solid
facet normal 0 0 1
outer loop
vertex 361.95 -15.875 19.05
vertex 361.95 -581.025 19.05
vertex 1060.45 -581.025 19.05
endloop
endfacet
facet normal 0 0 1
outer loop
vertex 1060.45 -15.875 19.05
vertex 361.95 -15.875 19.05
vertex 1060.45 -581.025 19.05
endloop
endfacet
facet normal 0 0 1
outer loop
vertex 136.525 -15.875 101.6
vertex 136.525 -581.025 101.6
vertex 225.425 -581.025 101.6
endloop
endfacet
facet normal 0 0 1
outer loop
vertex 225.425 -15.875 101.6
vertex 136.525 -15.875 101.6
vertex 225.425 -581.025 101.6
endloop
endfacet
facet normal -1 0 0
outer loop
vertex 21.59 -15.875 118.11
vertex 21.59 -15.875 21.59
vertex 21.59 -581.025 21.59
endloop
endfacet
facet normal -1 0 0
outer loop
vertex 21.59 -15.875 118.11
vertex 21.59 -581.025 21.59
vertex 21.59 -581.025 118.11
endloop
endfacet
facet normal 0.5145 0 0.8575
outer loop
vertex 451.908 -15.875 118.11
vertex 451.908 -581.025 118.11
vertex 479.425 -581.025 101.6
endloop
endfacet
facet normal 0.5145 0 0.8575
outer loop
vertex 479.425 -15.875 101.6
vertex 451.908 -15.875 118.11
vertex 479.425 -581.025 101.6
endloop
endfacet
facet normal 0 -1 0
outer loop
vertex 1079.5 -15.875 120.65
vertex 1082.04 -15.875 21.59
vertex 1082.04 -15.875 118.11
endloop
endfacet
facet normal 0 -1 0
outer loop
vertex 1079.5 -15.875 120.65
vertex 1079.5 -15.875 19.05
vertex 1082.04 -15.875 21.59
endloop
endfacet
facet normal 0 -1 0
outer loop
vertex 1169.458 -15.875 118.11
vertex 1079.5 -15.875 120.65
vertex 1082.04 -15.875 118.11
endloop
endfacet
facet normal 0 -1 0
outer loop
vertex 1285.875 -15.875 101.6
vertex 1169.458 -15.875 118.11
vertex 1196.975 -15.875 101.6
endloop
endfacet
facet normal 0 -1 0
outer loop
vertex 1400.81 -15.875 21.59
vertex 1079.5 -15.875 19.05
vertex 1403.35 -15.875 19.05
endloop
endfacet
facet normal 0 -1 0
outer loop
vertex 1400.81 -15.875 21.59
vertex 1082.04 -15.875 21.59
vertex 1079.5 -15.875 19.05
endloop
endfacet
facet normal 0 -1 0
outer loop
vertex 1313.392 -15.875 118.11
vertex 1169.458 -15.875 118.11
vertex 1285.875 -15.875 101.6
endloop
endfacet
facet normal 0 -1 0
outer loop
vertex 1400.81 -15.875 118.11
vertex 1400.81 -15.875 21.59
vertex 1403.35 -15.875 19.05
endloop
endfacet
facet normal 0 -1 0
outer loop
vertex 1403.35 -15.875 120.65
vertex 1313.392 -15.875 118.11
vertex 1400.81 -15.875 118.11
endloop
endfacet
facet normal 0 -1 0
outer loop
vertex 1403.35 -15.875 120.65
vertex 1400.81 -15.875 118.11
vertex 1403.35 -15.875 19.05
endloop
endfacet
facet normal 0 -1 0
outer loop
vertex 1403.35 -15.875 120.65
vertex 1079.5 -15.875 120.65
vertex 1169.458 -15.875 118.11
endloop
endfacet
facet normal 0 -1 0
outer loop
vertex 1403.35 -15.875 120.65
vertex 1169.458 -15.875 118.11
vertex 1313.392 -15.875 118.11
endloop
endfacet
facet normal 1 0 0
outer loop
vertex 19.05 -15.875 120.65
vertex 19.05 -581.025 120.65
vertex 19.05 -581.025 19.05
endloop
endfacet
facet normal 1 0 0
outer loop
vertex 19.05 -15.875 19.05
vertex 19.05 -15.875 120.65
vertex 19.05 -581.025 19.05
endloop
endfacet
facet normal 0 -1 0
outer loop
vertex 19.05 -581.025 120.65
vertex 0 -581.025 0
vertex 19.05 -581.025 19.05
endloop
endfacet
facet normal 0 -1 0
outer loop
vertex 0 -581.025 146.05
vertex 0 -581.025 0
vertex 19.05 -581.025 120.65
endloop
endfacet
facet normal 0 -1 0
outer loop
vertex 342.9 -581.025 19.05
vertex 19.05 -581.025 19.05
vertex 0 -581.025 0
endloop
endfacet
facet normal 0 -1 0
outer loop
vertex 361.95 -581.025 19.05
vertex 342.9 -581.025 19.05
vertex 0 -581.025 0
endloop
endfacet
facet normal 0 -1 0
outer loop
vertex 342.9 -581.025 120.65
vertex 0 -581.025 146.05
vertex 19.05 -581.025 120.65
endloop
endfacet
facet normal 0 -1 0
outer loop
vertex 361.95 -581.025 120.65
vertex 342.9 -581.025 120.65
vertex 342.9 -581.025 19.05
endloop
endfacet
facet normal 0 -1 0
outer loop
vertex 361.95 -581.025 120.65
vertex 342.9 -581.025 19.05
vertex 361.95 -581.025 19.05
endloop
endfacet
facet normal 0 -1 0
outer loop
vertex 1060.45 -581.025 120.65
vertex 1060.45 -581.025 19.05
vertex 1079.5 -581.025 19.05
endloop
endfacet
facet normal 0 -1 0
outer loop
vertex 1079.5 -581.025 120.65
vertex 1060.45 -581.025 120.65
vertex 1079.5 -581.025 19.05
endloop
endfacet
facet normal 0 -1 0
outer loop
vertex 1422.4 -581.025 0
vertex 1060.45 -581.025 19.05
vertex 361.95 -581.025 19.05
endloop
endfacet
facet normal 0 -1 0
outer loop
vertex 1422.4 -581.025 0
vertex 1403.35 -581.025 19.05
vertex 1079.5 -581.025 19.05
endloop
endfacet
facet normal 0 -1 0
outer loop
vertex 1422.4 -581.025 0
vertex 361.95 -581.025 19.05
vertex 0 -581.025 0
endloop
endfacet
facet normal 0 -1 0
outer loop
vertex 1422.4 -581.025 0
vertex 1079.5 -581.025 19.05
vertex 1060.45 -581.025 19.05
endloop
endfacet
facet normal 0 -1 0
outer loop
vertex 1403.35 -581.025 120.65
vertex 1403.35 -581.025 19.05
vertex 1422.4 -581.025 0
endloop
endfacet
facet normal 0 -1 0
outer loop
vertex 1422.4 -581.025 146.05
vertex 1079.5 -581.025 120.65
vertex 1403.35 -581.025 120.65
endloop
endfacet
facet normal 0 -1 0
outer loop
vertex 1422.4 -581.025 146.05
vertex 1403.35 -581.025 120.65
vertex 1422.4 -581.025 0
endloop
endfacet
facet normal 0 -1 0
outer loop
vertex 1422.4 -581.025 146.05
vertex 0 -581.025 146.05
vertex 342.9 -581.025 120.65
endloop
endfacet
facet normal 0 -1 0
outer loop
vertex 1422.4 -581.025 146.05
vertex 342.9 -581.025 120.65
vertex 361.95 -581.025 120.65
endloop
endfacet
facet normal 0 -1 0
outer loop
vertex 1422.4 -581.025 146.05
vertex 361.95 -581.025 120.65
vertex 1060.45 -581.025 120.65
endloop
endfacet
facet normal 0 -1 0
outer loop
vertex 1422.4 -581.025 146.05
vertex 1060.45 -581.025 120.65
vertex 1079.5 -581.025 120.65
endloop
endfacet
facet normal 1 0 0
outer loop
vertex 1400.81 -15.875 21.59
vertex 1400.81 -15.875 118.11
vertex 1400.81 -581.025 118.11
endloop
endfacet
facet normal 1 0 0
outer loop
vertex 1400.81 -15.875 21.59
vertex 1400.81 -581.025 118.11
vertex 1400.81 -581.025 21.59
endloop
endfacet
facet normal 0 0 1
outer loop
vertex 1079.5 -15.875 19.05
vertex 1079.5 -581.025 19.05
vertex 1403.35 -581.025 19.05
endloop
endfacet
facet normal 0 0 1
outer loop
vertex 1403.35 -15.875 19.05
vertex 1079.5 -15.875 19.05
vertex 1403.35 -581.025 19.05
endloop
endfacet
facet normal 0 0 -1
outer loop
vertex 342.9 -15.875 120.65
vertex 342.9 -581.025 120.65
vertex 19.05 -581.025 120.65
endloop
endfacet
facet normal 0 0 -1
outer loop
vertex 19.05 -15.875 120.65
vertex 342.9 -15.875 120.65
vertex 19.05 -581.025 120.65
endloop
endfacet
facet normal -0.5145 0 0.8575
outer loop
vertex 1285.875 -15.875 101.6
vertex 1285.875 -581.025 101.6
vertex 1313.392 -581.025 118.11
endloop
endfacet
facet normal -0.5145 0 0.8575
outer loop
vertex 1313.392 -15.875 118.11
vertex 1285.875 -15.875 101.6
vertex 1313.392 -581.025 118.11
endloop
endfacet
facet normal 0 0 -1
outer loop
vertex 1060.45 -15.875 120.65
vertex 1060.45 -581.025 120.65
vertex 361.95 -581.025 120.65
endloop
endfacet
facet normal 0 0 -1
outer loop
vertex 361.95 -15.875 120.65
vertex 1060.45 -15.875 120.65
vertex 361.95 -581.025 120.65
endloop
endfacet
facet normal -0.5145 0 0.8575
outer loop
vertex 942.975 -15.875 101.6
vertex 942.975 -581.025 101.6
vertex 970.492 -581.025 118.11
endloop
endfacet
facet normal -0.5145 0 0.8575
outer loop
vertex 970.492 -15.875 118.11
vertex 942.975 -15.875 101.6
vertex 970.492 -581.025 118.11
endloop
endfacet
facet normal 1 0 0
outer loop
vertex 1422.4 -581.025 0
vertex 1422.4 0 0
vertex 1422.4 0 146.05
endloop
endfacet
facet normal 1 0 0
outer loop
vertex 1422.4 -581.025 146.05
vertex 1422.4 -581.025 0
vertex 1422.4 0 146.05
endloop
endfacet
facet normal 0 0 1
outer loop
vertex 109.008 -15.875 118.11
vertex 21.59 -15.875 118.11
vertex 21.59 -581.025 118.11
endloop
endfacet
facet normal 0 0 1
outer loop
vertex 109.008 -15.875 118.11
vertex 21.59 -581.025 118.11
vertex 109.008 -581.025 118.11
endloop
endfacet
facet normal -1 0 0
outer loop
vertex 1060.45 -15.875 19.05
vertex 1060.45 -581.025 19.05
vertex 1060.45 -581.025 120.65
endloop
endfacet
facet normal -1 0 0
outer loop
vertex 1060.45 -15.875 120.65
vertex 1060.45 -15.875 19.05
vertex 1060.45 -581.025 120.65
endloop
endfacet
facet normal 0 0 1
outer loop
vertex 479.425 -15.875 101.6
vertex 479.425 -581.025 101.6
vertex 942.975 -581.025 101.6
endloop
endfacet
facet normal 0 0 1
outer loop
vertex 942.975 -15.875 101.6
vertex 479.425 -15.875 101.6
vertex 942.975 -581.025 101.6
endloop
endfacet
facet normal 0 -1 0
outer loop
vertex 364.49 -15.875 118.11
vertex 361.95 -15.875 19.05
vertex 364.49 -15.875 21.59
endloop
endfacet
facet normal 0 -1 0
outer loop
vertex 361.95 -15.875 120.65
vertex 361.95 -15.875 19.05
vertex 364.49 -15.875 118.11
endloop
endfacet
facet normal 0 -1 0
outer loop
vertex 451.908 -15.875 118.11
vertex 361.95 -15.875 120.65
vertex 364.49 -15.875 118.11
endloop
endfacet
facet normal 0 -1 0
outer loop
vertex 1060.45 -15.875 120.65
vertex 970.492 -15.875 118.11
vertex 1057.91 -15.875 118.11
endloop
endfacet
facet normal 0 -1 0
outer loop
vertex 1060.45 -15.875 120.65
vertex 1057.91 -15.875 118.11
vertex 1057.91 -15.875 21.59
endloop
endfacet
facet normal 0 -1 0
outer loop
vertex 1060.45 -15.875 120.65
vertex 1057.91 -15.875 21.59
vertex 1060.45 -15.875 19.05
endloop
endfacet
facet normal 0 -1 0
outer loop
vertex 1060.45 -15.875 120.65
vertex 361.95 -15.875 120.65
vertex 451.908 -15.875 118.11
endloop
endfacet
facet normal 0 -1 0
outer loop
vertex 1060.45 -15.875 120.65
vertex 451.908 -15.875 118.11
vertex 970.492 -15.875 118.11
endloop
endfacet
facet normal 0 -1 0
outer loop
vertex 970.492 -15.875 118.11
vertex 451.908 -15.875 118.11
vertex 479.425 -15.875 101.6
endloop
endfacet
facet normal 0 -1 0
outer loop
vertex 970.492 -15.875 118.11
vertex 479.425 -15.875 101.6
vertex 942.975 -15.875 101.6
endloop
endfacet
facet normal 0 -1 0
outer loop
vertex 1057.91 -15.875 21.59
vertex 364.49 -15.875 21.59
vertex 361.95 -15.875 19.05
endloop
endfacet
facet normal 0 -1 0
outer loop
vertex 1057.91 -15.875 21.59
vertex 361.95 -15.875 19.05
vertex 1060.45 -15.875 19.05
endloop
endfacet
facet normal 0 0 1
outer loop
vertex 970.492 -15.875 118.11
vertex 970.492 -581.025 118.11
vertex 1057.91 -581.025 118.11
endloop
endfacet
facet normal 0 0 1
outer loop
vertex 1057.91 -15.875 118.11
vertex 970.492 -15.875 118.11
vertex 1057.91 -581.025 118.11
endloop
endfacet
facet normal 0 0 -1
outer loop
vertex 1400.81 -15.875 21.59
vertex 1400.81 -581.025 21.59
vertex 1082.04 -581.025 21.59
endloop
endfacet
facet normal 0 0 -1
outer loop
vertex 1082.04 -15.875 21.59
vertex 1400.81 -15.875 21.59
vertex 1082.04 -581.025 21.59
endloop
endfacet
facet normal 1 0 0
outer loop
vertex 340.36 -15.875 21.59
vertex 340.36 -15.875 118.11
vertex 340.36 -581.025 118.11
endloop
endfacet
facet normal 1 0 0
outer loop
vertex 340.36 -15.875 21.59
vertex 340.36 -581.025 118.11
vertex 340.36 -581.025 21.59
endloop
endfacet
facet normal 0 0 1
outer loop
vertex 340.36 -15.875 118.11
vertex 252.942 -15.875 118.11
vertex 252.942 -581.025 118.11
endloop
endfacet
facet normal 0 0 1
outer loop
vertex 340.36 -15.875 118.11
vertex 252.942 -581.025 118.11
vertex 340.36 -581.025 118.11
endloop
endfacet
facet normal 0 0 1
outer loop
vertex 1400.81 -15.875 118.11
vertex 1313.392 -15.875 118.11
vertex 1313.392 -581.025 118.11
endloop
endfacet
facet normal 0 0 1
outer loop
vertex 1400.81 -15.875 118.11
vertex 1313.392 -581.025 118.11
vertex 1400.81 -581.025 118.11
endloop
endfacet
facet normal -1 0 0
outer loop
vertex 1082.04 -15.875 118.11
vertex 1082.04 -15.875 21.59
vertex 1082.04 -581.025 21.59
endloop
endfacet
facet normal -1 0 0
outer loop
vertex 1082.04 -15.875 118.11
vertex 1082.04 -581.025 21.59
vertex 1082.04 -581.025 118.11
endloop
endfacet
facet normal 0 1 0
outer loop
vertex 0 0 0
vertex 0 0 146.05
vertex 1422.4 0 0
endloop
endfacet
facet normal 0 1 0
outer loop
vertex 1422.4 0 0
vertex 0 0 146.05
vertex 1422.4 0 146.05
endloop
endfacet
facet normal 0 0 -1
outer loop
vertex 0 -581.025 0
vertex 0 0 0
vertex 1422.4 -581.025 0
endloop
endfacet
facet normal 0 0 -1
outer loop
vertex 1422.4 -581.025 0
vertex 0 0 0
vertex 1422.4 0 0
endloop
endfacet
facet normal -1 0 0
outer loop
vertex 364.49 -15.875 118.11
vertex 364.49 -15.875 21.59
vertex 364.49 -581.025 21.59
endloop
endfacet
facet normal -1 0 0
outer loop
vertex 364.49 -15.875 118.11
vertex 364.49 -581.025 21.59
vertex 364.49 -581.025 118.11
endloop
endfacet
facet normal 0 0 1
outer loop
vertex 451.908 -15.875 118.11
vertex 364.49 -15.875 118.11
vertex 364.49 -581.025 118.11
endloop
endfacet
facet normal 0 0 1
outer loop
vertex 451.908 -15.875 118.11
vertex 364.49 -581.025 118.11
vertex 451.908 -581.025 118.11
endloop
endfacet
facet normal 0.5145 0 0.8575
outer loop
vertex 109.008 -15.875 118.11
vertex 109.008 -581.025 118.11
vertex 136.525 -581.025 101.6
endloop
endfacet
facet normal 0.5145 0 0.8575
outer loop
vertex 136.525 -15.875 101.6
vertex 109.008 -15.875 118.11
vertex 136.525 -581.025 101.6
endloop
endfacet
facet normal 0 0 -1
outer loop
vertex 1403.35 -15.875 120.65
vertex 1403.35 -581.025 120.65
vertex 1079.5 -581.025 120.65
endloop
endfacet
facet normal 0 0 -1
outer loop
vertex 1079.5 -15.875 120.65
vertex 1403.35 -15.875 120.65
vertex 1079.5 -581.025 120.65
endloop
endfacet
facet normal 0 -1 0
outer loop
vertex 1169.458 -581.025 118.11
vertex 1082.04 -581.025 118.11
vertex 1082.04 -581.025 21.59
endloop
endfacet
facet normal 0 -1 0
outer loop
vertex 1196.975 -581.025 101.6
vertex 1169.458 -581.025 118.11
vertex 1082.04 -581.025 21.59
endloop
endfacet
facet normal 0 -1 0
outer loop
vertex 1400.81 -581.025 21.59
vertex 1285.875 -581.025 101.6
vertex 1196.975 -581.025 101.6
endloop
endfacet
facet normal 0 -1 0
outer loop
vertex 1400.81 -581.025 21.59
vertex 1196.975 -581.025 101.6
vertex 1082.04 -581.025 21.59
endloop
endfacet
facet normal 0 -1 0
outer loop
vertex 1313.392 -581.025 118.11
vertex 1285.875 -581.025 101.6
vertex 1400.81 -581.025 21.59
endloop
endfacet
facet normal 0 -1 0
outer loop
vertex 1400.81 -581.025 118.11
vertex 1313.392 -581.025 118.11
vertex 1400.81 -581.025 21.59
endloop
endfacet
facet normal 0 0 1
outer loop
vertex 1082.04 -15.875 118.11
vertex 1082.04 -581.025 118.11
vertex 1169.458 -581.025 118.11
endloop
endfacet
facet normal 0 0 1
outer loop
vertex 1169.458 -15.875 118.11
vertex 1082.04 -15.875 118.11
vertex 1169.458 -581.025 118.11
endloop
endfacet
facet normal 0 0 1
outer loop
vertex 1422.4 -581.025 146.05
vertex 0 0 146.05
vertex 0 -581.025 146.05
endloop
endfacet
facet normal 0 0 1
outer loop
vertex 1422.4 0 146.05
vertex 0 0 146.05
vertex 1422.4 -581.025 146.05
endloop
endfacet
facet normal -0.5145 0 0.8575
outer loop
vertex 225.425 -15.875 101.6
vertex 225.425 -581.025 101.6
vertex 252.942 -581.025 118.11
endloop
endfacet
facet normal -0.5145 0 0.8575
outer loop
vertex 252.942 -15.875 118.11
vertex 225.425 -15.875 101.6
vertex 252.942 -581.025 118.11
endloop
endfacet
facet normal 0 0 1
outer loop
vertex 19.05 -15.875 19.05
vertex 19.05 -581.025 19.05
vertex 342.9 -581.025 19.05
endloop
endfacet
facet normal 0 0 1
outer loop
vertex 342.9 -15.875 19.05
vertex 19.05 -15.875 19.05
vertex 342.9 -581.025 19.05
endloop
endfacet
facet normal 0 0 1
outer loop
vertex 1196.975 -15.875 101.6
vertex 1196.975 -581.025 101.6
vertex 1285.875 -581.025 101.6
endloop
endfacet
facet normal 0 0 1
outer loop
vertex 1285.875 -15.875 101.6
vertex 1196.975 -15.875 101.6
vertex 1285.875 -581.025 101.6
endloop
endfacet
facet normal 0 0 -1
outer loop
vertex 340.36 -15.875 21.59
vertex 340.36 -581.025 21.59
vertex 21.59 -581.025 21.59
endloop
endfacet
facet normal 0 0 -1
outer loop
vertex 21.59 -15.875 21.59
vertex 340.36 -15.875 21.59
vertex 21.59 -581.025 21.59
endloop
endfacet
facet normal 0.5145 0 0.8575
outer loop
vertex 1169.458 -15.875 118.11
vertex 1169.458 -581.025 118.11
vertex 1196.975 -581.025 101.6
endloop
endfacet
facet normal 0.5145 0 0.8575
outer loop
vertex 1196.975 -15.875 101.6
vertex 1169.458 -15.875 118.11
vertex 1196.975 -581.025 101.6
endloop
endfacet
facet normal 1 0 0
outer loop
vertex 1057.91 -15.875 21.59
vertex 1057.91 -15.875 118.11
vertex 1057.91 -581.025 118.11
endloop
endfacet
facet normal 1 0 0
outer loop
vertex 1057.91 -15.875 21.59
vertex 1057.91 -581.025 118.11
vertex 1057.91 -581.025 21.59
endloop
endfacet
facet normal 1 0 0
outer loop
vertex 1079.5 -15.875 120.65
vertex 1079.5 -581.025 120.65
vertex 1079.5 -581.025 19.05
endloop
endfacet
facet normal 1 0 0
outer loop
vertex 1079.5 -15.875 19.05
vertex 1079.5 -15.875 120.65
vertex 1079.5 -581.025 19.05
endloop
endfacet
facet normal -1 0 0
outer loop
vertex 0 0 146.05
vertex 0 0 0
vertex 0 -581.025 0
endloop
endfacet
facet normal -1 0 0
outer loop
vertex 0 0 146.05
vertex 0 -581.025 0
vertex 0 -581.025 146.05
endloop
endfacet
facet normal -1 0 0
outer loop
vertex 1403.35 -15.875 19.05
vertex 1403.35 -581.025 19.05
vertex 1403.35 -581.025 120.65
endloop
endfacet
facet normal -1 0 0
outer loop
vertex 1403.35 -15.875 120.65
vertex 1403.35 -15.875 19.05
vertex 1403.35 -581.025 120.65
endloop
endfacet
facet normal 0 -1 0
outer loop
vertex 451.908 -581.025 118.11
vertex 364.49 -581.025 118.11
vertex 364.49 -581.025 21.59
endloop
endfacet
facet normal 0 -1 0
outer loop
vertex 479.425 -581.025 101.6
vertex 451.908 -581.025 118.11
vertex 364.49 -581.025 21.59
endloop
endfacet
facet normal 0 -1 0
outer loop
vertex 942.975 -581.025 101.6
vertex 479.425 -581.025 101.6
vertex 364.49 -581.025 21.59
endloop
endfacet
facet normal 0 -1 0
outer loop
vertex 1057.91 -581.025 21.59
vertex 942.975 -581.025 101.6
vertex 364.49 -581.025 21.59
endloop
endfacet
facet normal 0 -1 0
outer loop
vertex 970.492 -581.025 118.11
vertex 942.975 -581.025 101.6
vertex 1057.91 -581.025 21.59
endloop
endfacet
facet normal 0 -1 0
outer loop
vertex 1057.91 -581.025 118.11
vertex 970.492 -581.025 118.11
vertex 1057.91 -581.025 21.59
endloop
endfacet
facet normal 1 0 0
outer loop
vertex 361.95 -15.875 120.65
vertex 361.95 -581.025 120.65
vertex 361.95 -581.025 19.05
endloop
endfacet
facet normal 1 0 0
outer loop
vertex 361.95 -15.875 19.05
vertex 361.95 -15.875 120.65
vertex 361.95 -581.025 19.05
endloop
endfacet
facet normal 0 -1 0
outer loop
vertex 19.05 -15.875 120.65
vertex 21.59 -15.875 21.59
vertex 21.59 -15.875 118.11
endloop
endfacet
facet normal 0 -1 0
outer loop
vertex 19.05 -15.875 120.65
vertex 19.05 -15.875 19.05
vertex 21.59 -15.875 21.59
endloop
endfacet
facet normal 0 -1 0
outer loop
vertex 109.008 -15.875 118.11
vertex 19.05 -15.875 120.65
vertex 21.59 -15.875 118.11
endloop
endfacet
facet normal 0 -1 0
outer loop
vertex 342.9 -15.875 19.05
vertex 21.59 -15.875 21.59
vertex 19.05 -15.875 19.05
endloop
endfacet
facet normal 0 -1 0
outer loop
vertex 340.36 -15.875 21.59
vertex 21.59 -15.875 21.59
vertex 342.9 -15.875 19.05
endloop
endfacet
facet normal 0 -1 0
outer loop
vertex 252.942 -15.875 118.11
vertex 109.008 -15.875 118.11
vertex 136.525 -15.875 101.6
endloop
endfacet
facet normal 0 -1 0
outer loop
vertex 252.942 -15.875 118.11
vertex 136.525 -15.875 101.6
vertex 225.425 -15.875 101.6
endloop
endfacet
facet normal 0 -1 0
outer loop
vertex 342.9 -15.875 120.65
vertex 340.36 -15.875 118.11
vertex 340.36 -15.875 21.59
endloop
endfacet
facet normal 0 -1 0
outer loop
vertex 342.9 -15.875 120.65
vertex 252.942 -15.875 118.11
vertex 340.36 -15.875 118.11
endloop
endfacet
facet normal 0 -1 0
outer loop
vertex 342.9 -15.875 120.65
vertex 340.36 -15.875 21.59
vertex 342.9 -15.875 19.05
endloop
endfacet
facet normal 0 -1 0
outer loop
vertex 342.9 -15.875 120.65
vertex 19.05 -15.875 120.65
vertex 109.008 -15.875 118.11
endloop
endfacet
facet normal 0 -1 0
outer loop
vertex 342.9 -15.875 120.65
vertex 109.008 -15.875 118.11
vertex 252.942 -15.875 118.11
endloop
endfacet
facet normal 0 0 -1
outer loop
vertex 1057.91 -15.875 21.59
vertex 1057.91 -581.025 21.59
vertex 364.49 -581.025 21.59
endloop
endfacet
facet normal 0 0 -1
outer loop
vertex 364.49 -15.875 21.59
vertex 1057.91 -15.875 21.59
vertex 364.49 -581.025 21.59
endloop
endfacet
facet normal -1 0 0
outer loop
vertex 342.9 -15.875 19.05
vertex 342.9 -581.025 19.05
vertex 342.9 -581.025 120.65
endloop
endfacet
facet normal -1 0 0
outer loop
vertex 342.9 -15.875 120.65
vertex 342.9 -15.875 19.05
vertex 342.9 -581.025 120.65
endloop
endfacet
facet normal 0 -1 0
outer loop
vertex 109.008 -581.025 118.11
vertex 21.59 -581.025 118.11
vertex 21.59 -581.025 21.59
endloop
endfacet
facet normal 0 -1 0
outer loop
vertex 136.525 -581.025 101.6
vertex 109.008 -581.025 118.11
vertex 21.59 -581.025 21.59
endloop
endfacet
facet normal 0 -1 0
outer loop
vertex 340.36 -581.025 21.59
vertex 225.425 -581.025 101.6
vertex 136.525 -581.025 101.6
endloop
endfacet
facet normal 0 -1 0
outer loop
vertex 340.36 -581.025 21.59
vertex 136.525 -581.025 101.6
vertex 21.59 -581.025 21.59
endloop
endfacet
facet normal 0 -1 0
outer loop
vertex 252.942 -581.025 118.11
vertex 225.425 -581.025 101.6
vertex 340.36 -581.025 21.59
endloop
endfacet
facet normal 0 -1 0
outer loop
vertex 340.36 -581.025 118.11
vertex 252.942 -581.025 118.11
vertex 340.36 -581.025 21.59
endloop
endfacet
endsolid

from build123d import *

# Parameters (mm, degrees)
F0_W     = 1422.4
F0_H     = 146.05
F1_DEPTH = 581.025
F3_DEPTH = 565.15


with BuildPart() as f1:
    # F0 (on Front) → F1 (new body)
    with BuildSketch(Plane.XZ):
        with Locations((711.2, 73.025)):
            Rectangle(F0_W, F0_H)
    extrude(amount=F1_DEPTH)

    # F2 (on face) → F3 (cut)
    with BuildSketch(Plane.XZ.offset(581.025)):
        Polygon((104.775, 120.65), (19.05, 120.65), (19.05, 19.05), (342.9, 19.05), (342.9, 120.65), (257.175, 120.65), (252.9416666667, 118.11), (340.36, 118.11), (340.36, 21.59), (21.59, 21.59), (21.59, 118.11), (109.0083333333, 118.11), align=None)
        Polygon((361.95, 120.65), (361.95, 19.05), (1060.45, 19.05), (1060.45, 120.65), (974.725, 120.65), (970.4916666667, 118.11), (1057.91, 118.11), (1057.91, 21.59), (364.49, 21.59), (364.49, 118.11), (451.9083333333, 118.11), (447.675, 120.65), align=None)
        Polygon((1165.225, 120.65), (1079.5, 120.65), (1079.5, 19.05), (1403.35, 19.05), (1403.35, 120.65), (1317.625, 120.65), (1313.3916666667, 118.11), (1400.81, 118.11), (1400.81, 21.59), (1082.04, 21.59), (1082.04, 118.11), (1169.4583333333, 118.11), align=None)
        Polygon((1317.625, 120.65), (1165.225, 120.65), (1169.4583333333, 118.11), (1313.3916666667, 118.11), align=None)
        Polygon((1313.3916666667, 118.11), (1169.4583333333, 118.11), (1196.975, 101.6), (1285.875, 101.6), align=None)
        Polygon((970.4916666667, 118.11), (451.9083333333, 118.11), (479.425, 101.6), (942.975, 101.6), align=None)
        Polygon((974.725, 120.65), (447.675, 120.65), (451.9083333333, 118.11), (970.4916666667, 118.11), align=None)
        Polygon((257.175, 120.65), (104.775, 120.65), (109.0083333333, 118.11), (252.9416666667, 118.11), align=None)
        Polygon((252.9416666667, 118.11), (109.0083333333, 118.11), (136.525, 101.6), (225.425, 101.6), align=None)
    extrude(amount=-F3_DEPTH, mode=Mode.SUBTRACT)


solid = f1.part
